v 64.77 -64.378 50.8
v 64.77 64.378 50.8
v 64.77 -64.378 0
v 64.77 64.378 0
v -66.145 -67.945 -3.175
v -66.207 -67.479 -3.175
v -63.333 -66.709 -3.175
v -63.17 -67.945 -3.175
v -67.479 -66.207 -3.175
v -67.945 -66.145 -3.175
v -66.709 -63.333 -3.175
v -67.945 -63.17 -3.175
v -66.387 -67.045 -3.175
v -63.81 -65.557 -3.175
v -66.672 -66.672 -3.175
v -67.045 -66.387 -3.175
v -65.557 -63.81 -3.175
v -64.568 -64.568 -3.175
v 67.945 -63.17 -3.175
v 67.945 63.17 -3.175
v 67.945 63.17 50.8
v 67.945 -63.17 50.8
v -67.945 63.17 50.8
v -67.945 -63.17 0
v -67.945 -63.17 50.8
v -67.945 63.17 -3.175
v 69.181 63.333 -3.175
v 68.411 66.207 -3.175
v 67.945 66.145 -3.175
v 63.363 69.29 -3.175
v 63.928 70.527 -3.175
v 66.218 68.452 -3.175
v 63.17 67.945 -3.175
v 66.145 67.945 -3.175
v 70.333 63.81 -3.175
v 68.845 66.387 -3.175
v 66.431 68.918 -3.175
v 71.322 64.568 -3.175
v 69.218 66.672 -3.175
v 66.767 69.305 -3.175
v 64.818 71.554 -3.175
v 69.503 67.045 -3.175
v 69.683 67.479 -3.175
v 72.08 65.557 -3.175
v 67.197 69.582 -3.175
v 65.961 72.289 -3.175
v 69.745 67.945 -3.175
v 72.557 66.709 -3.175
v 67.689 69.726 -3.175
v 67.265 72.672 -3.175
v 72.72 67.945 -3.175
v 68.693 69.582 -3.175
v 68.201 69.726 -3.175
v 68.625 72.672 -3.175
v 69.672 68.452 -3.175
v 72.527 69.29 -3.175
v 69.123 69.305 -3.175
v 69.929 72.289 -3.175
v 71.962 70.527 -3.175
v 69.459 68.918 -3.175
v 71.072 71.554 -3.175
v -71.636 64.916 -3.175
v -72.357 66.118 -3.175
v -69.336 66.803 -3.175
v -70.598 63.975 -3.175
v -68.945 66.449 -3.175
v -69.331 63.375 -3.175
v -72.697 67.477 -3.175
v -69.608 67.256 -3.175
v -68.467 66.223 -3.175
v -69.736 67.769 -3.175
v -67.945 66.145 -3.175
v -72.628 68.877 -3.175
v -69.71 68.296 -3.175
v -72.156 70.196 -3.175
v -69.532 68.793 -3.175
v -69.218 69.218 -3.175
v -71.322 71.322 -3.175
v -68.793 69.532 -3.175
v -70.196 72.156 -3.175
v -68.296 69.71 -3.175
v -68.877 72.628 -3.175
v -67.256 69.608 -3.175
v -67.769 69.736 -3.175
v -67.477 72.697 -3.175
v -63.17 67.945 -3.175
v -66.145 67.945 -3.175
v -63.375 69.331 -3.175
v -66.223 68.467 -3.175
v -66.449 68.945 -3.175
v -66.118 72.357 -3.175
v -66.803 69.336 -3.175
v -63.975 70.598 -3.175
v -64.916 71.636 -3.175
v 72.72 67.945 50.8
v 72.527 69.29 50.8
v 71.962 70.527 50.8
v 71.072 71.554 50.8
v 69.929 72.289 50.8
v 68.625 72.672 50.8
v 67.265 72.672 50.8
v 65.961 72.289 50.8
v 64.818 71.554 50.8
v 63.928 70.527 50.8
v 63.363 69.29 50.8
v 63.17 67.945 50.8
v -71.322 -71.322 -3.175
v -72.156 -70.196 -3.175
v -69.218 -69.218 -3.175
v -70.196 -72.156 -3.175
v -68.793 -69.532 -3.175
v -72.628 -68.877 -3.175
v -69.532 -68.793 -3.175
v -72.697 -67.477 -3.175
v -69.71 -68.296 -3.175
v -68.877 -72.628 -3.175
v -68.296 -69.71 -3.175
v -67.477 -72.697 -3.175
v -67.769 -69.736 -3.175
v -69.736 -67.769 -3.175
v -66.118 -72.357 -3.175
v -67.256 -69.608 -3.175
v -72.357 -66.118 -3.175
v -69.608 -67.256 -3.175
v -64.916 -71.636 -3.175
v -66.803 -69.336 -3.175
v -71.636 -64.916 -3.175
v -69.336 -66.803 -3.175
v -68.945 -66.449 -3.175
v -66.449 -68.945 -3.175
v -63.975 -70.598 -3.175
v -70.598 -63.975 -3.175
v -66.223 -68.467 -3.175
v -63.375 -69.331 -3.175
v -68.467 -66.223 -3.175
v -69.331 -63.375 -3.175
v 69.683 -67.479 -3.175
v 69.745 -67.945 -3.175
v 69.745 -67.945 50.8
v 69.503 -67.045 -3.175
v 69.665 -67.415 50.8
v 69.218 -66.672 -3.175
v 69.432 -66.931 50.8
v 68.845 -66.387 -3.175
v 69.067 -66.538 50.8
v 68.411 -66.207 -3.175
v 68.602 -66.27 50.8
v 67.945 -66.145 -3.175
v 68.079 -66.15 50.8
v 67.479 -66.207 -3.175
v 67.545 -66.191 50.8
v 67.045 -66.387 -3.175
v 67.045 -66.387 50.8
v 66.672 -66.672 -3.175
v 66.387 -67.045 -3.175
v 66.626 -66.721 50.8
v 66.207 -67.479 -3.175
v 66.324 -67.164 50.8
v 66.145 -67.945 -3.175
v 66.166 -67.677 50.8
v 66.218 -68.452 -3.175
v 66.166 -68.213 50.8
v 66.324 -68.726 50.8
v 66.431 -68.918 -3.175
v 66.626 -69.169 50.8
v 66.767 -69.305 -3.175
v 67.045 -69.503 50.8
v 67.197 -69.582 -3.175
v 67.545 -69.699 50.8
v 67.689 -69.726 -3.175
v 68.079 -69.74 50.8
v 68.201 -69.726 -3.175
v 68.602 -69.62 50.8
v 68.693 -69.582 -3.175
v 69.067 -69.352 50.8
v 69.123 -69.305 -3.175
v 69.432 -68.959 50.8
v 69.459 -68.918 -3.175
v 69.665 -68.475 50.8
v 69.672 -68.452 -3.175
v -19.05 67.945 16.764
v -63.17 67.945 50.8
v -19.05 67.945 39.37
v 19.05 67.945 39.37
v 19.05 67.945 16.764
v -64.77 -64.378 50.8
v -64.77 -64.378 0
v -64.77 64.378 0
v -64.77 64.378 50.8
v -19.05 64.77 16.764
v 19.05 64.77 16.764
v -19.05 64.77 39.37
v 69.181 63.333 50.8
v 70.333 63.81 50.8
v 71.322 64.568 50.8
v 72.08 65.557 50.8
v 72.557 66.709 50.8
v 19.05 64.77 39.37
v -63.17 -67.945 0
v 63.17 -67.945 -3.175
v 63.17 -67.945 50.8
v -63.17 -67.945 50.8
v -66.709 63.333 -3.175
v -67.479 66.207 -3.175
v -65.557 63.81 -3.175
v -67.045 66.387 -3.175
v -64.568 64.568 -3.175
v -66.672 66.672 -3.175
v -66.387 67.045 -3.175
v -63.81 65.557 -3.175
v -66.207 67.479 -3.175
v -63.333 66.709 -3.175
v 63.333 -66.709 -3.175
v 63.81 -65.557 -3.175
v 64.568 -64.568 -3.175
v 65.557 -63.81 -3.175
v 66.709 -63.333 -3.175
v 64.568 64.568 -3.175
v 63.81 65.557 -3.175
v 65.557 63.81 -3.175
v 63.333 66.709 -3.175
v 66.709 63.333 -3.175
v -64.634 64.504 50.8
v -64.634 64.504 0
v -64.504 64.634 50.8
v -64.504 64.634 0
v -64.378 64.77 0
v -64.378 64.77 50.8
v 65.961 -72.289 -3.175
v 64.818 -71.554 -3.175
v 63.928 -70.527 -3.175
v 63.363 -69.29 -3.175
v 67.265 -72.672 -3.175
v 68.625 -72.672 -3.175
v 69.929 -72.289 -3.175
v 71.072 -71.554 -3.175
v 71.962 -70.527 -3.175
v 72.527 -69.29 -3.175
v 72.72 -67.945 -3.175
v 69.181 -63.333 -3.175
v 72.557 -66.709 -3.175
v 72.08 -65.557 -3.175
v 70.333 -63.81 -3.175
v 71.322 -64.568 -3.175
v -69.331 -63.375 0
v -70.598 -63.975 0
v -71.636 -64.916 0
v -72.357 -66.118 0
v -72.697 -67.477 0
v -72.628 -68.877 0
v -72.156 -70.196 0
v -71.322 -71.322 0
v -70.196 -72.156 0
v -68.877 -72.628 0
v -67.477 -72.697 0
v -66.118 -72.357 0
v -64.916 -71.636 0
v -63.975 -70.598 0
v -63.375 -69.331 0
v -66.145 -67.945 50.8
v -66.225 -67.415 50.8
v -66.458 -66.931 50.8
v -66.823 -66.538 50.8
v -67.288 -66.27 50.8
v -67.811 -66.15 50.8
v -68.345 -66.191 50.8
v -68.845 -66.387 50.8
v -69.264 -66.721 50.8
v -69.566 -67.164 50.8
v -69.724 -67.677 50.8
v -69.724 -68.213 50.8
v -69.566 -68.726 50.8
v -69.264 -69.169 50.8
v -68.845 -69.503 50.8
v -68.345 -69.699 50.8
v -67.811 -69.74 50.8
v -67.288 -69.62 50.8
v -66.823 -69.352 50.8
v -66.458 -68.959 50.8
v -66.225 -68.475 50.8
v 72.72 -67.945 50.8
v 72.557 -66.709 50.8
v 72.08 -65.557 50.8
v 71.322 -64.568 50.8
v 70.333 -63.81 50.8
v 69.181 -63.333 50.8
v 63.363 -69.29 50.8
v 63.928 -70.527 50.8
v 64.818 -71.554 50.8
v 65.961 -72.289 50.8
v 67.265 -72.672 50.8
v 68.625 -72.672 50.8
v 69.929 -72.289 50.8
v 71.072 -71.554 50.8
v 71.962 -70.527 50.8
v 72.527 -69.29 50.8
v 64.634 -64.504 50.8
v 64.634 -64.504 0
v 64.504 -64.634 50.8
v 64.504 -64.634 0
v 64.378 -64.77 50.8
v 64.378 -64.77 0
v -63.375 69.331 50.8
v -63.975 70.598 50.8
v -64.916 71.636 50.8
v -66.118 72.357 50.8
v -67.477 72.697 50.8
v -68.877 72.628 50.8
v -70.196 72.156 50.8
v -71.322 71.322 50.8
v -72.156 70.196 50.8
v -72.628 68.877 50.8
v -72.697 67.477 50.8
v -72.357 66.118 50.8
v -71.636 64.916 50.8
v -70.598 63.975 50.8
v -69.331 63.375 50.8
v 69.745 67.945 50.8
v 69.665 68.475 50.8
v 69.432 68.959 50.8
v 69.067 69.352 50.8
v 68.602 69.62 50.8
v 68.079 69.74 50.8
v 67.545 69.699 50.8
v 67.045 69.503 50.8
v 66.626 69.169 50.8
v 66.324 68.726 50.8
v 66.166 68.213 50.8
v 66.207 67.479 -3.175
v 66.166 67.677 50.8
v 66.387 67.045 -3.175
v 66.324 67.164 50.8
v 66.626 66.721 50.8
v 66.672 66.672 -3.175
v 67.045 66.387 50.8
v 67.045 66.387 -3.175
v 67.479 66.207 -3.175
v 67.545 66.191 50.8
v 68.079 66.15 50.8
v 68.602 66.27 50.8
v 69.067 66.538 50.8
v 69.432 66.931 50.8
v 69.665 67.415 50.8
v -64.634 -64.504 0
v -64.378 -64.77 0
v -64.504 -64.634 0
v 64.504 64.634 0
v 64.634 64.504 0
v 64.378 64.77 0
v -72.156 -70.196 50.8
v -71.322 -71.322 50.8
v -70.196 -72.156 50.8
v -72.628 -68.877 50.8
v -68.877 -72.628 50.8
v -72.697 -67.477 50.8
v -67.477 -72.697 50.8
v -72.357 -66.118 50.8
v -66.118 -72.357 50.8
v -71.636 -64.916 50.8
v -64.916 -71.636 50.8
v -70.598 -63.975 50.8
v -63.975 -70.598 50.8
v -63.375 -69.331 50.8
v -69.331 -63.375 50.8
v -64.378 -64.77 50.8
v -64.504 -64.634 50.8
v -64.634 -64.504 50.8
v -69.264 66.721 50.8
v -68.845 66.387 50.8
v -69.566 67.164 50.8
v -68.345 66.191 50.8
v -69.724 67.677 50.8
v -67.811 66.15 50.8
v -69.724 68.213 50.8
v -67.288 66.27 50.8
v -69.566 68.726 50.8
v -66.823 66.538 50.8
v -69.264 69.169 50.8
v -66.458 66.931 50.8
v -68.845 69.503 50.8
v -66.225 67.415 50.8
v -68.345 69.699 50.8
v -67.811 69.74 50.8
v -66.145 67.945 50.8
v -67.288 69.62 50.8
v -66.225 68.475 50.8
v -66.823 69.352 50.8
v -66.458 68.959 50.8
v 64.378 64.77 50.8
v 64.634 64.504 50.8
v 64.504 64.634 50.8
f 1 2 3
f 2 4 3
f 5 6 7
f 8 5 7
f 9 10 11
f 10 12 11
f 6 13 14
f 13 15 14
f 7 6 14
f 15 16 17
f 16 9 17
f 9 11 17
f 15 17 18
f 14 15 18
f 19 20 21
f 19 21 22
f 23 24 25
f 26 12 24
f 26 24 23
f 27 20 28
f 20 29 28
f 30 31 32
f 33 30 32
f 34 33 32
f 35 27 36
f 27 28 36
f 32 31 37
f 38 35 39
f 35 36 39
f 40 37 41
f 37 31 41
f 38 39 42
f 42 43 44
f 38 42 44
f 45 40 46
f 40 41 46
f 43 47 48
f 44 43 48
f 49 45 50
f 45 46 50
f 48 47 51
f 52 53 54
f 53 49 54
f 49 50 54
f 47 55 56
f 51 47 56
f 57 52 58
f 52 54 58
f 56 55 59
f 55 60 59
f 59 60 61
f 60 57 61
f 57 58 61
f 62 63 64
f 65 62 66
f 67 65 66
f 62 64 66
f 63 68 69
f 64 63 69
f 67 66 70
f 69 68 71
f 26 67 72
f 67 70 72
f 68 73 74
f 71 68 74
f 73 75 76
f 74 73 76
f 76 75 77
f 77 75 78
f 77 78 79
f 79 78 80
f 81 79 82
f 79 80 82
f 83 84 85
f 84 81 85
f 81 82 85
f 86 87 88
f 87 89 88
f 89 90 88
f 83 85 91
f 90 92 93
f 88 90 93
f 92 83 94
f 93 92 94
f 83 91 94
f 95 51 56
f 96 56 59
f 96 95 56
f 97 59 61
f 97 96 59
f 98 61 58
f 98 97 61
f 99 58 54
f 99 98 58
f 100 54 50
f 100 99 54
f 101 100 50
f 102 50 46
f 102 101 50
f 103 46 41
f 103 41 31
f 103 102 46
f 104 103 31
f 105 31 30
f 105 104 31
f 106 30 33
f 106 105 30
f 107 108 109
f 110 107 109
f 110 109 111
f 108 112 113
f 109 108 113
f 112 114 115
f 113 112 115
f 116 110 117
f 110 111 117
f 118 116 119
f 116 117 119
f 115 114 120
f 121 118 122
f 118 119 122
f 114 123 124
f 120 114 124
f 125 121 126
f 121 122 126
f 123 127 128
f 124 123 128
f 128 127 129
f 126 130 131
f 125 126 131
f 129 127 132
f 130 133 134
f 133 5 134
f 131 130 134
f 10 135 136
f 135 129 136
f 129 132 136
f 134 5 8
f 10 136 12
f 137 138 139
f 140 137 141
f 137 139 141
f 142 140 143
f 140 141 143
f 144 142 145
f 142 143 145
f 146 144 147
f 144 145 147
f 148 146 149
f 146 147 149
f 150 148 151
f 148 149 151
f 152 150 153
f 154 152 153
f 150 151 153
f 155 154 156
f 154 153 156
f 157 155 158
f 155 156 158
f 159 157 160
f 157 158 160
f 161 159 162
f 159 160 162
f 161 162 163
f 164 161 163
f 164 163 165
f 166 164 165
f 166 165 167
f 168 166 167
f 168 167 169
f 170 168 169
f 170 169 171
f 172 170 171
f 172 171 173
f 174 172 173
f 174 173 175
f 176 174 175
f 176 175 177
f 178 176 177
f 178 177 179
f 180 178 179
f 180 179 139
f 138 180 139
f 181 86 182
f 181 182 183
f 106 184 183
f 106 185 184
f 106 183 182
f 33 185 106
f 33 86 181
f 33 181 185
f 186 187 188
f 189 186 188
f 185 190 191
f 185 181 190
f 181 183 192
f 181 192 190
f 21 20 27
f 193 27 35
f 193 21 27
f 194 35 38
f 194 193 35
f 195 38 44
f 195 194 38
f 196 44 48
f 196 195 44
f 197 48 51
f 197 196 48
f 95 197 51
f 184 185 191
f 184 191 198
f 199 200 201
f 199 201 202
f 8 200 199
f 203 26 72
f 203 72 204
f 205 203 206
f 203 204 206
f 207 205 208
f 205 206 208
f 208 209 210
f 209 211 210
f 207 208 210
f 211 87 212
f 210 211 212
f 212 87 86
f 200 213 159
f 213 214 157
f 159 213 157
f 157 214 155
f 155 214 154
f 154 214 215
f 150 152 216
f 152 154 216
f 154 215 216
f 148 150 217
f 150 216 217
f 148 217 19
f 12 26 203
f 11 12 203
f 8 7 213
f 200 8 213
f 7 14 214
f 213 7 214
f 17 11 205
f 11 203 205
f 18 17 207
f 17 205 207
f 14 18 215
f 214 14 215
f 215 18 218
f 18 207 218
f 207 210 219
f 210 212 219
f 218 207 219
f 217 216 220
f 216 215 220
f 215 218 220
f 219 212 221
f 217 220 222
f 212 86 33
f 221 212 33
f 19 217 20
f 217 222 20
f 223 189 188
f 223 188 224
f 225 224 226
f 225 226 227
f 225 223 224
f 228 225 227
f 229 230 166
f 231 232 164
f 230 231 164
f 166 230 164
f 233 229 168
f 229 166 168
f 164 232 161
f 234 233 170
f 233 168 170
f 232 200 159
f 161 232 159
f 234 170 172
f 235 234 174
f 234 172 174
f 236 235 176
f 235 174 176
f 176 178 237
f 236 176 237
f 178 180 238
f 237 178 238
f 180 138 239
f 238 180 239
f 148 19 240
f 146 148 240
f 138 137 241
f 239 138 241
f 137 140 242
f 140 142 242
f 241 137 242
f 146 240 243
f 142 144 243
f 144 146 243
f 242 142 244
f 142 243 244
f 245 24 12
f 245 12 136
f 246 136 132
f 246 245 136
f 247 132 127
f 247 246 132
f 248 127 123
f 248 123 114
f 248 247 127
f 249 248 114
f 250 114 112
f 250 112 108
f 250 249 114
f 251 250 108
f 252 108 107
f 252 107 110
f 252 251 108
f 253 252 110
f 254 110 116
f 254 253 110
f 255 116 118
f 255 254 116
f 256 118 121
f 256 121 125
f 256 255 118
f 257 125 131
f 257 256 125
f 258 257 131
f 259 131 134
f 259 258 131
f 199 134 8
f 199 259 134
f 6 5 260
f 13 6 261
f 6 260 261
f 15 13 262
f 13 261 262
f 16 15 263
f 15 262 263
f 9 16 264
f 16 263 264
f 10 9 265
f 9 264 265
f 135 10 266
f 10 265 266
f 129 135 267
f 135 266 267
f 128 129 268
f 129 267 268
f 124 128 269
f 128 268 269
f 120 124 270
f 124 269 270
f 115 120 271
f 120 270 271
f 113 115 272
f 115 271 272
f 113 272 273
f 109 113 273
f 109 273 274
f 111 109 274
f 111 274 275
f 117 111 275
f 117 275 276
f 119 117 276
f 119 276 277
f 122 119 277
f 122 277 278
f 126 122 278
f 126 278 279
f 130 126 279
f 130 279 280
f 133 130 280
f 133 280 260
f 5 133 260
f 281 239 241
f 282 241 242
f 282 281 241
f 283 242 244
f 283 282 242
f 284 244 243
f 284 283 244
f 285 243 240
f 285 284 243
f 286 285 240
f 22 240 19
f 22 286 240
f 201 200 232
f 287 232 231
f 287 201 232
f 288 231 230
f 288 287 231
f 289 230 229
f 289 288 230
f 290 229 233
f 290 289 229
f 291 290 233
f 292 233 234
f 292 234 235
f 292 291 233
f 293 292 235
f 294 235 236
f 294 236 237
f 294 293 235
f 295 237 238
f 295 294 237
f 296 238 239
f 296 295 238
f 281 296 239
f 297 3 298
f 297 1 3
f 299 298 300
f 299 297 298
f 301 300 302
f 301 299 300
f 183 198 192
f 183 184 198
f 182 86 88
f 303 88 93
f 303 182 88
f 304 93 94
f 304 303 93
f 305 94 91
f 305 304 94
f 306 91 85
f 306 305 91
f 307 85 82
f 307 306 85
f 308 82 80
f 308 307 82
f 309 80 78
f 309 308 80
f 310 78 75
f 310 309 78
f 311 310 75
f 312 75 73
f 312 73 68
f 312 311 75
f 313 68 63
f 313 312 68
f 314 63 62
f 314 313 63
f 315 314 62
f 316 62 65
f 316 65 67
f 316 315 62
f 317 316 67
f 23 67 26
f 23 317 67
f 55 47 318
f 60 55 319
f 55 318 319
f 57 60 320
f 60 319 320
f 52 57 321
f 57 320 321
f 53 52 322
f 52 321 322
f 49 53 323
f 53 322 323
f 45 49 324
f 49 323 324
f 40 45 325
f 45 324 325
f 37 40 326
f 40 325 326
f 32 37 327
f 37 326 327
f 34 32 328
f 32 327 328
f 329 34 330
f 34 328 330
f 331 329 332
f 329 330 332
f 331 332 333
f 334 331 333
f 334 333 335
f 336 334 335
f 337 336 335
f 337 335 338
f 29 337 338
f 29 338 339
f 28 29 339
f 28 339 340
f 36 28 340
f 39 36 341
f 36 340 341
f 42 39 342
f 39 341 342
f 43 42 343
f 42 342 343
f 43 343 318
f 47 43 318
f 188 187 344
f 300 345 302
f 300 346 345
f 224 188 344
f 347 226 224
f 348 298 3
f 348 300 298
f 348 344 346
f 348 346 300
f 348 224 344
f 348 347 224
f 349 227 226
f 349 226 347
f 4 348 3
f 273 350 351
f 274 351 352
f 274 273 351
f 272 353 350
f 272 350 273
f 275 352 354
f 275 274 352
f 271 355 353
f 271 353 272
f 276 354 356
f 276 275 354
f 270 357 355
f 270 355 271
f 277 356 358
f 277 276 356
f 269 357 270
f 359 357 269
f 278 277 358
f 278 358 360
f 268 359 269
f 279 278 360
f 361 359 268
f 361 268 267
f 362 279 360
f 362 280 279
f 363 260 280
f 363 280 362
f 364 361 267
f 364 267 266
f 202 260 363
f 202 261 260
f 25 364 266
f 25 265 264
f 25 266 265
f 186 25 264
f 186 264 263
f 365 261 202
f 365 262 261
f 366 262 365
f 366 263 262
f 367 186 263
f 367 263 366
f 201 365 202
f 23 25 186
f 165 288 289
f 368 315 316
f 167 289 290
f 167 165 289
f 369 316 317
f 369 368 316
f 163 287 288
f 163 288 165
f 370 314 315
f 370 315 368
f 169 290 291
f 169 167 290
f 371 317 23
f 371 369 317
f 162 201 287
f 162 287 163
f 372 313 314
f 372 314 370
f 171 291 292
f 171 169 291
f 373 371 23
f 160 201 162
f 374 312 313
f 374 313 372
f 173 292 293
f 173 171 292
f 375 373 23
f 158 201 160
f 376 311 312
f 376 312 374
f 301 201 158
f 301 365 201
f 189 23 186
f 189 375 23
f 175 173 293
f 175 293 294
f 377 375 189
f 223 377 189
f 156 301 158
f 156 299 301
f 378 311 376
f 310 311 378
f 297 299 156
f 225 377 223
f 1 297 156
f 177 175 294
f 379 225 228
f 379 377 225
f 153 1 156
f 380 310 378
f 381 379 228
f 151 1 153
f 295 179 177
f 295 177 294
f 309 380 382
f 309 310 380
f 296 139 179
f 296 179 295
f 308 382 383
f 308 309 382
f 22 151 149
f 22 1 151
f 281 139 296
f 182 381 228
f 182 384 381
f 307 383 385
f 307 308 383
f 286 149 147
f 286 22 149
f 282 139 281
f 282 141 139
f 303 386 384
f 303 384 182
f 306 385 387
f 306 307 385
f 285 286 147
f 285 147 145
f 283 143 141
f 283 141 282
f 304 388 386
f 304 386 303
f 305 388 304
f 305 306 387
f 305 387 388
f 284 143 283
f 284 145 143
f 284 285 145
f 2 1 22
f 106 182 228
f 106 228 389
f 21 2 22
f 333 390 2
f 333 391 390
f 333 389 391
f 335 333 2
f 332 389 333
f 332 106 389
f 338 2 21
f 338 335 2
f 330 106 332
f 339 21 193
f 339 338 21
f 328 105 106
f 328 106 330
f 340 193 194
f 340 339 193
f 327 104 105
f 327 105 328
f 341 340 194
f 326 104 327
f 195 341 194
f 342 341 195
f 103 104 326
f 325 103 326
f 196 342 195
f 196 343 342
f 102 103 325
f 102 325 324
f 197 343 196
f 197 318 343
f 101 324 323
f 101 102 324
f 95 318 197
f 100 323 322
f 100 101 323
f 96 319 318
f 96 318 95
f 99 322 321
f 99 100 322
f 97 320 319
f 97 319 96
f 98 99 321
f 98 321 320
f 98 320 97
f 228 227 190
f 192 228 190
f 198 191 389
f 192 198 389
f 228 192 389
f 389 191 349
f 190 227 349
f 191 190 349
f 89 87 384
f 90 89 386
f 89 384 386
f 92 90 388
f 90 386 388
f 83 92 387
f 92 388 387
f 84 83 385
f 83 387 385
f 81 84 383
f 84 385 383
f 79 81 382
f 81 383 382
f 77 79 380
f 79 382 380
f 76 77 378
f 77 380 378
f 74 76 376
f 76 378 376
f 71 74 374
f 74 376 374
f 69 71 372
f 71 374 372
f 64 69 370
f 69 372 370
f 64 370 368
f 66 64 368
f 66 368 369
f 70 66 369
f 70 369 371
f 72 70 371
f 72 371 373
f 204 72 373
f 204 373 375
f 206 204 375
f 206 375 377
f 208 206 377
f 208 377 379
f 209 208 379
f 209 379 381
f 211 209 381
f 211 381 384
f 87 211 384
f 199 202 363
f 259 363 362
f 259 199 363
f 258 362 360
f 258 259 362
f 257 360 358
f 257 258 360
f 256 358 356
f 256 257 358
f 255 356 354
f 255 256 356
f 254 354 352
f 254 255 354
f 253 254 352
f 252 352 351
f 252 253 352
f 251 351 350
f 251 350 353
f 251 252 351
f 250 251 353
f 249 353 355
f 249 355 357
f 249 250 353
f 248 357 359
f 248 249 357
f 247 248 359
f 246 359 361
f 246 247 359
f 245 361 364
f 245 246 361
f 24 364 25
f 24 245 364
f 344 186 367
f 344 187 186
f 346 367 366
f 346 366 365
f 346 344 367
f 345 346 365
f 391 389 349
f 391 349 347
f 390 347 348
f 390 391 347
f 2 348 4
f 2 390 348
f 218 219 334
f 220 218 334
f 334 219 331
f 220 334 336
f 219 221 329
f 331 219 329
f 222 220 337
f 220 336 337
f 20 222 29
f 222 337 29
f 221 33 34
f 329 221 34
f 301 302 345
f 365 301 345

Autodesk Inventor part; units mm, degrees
ref_plane "YZ Plane" through (0, 0, 0) normal (1, 0, 0) x (0, 1, 0)
ref_plane "XZ Plane" through (0, 0, 0) normal (0, 1, 0) x (-1, 0, 0)
ref_plane "XY Plane" through (0, 0, 0) normal (0, 0, 1) x (1, 0, 0)
sketch "Sketch1" plane through (0, 0, 0) normal (0, 0, 1) x (1, 0, 0)
  line L0 (-64.77, 64.77) -> (64.77, 64.77)
  line L1 (64.77, 64.77) -> (64.77, -64.77)
  line L2 (64.77, -64.77) -> (-64.77, -64.77)
  line L3 (-64.77, -64.77) -> (-64.77, 64.77)
  line L4 (-64.77, 64.77) -> (64.77, -64.77) construction
  line L5 (64.77, 64.77) -> (-64.77, -64.77) construction
  point P0 (0, 0)
  dimension "d0" = 129.54
extrude "Extrusion1" add sketch "Sketch1" along normal blind 50.8
shell "Shell1" thickness 3.175 outward yes removed faces 1 at (-21.59, -21.59, 50.8)
sketch "Sketch2" plane through (0, 0, 0) normal (0, 0, 1) x (1, 0, 0)
  line L0 (-67.945, 67.945) -> (-67.945, -67.945) projected
  circle A0 centre (-67.945, 67.945) radius 4.7752
  line L1 (67.945, -67.945) -> (67.945, 67.945) projected
  circle A1 centre (67.945, 67.945) radius 4.7752
  line L2 (-67.945, -67.945) -> (67.945, -67.945) projected
  circle A2 centre (67.945, -67.945) radius 4.7752
  circle A3 centre (-67.945, -67.945) radius 4.7752
  point P0 (0, 0)
  dimension "d4" = 9.5504
extrude "Extrusion2" add sketch "Sketch2" along normal blind 50.8 and the other way blind 3.175
sketch "Sketch3" plane through (0, 0, 50.8) normal (0, 0, 1) x (1, 0, 0)
  line L0 (-67.945, 63.1698) -> (-67.945, -63.1698) projected
  circle A0 centre (-67.945, -67.945) radius 1.7996
  line L1 (-63.1698, -67.945) -> (63.1698, -67.945) projected
  arc A1 (-67.945, -63.1698) -> (-63.1698, -67.945) centre (-67.945, -67.945) ccw projected
  arc A2 (-63.1698, 67.945) -> (-67.945, 63.1698) centre (-67.945, 67.945) ccw projected
  circle A3 centre (-67.945, 67.945) radius 1.7996
  arc A4 (67.945, 63.1698) -> (63.1698, 67.945) centre (67.945, 67.945) ccw projected
  circle A5 centre (67.945, 67.945) radius 1.7996
  arc A6 (63.1698, -67.945) -> (67.945, -63.1698) centre (67.945, -67.945) ccw projected
  circle A7 centre (67.945, -67.945) radius 1.7996
  point P0 (0, 0)
  point P1 (82.55, 82.55)
  dimension "d17" = 3.5992
extrude "Extrusion3" cut sketch "Sketch3" along normal mid plane 107.95
sketch "Sketch4" plane through (-63.1698, 67.945, -3.175) normal (0, 1, 0) x (1, 0, 0)
  line L0 (44.1198, -19.939) -> (82.2198, -19.939)
  line L1 (82.2198, -19.939) -> (82.2198, -42.545)
  line L2 (82.2198, -42.545) -> (44.1198, -42.545)
  line L3 (44.1198, -42.545) -> (44.1198, -19.939)
  line L4 (44.1198, -19.939) -> (82.2198, -42.545) construction
  line L5 (82.2198, -19.939) -> (44.1198, -42.545) construction
  line L6 (126.3396, -53.975) -> (0, -53.975) projected
  point P0 (63.1698, -3.175)
  point P1 (63.1698, -31.242)
  point P2 (63.1698, -31.242)
  point P3 (160.9128, -53.975)
  point P4 (-0.588, -53.975)
  dimension "d12" = 38.1
  dimension "d13" = 22.606
  dimension "d14" = 11.43
extrude "Extrusion4" cut sketch "Sketch4" against normal up to next
properties part number "PS-01" material "Aluminum 6061(1)"
